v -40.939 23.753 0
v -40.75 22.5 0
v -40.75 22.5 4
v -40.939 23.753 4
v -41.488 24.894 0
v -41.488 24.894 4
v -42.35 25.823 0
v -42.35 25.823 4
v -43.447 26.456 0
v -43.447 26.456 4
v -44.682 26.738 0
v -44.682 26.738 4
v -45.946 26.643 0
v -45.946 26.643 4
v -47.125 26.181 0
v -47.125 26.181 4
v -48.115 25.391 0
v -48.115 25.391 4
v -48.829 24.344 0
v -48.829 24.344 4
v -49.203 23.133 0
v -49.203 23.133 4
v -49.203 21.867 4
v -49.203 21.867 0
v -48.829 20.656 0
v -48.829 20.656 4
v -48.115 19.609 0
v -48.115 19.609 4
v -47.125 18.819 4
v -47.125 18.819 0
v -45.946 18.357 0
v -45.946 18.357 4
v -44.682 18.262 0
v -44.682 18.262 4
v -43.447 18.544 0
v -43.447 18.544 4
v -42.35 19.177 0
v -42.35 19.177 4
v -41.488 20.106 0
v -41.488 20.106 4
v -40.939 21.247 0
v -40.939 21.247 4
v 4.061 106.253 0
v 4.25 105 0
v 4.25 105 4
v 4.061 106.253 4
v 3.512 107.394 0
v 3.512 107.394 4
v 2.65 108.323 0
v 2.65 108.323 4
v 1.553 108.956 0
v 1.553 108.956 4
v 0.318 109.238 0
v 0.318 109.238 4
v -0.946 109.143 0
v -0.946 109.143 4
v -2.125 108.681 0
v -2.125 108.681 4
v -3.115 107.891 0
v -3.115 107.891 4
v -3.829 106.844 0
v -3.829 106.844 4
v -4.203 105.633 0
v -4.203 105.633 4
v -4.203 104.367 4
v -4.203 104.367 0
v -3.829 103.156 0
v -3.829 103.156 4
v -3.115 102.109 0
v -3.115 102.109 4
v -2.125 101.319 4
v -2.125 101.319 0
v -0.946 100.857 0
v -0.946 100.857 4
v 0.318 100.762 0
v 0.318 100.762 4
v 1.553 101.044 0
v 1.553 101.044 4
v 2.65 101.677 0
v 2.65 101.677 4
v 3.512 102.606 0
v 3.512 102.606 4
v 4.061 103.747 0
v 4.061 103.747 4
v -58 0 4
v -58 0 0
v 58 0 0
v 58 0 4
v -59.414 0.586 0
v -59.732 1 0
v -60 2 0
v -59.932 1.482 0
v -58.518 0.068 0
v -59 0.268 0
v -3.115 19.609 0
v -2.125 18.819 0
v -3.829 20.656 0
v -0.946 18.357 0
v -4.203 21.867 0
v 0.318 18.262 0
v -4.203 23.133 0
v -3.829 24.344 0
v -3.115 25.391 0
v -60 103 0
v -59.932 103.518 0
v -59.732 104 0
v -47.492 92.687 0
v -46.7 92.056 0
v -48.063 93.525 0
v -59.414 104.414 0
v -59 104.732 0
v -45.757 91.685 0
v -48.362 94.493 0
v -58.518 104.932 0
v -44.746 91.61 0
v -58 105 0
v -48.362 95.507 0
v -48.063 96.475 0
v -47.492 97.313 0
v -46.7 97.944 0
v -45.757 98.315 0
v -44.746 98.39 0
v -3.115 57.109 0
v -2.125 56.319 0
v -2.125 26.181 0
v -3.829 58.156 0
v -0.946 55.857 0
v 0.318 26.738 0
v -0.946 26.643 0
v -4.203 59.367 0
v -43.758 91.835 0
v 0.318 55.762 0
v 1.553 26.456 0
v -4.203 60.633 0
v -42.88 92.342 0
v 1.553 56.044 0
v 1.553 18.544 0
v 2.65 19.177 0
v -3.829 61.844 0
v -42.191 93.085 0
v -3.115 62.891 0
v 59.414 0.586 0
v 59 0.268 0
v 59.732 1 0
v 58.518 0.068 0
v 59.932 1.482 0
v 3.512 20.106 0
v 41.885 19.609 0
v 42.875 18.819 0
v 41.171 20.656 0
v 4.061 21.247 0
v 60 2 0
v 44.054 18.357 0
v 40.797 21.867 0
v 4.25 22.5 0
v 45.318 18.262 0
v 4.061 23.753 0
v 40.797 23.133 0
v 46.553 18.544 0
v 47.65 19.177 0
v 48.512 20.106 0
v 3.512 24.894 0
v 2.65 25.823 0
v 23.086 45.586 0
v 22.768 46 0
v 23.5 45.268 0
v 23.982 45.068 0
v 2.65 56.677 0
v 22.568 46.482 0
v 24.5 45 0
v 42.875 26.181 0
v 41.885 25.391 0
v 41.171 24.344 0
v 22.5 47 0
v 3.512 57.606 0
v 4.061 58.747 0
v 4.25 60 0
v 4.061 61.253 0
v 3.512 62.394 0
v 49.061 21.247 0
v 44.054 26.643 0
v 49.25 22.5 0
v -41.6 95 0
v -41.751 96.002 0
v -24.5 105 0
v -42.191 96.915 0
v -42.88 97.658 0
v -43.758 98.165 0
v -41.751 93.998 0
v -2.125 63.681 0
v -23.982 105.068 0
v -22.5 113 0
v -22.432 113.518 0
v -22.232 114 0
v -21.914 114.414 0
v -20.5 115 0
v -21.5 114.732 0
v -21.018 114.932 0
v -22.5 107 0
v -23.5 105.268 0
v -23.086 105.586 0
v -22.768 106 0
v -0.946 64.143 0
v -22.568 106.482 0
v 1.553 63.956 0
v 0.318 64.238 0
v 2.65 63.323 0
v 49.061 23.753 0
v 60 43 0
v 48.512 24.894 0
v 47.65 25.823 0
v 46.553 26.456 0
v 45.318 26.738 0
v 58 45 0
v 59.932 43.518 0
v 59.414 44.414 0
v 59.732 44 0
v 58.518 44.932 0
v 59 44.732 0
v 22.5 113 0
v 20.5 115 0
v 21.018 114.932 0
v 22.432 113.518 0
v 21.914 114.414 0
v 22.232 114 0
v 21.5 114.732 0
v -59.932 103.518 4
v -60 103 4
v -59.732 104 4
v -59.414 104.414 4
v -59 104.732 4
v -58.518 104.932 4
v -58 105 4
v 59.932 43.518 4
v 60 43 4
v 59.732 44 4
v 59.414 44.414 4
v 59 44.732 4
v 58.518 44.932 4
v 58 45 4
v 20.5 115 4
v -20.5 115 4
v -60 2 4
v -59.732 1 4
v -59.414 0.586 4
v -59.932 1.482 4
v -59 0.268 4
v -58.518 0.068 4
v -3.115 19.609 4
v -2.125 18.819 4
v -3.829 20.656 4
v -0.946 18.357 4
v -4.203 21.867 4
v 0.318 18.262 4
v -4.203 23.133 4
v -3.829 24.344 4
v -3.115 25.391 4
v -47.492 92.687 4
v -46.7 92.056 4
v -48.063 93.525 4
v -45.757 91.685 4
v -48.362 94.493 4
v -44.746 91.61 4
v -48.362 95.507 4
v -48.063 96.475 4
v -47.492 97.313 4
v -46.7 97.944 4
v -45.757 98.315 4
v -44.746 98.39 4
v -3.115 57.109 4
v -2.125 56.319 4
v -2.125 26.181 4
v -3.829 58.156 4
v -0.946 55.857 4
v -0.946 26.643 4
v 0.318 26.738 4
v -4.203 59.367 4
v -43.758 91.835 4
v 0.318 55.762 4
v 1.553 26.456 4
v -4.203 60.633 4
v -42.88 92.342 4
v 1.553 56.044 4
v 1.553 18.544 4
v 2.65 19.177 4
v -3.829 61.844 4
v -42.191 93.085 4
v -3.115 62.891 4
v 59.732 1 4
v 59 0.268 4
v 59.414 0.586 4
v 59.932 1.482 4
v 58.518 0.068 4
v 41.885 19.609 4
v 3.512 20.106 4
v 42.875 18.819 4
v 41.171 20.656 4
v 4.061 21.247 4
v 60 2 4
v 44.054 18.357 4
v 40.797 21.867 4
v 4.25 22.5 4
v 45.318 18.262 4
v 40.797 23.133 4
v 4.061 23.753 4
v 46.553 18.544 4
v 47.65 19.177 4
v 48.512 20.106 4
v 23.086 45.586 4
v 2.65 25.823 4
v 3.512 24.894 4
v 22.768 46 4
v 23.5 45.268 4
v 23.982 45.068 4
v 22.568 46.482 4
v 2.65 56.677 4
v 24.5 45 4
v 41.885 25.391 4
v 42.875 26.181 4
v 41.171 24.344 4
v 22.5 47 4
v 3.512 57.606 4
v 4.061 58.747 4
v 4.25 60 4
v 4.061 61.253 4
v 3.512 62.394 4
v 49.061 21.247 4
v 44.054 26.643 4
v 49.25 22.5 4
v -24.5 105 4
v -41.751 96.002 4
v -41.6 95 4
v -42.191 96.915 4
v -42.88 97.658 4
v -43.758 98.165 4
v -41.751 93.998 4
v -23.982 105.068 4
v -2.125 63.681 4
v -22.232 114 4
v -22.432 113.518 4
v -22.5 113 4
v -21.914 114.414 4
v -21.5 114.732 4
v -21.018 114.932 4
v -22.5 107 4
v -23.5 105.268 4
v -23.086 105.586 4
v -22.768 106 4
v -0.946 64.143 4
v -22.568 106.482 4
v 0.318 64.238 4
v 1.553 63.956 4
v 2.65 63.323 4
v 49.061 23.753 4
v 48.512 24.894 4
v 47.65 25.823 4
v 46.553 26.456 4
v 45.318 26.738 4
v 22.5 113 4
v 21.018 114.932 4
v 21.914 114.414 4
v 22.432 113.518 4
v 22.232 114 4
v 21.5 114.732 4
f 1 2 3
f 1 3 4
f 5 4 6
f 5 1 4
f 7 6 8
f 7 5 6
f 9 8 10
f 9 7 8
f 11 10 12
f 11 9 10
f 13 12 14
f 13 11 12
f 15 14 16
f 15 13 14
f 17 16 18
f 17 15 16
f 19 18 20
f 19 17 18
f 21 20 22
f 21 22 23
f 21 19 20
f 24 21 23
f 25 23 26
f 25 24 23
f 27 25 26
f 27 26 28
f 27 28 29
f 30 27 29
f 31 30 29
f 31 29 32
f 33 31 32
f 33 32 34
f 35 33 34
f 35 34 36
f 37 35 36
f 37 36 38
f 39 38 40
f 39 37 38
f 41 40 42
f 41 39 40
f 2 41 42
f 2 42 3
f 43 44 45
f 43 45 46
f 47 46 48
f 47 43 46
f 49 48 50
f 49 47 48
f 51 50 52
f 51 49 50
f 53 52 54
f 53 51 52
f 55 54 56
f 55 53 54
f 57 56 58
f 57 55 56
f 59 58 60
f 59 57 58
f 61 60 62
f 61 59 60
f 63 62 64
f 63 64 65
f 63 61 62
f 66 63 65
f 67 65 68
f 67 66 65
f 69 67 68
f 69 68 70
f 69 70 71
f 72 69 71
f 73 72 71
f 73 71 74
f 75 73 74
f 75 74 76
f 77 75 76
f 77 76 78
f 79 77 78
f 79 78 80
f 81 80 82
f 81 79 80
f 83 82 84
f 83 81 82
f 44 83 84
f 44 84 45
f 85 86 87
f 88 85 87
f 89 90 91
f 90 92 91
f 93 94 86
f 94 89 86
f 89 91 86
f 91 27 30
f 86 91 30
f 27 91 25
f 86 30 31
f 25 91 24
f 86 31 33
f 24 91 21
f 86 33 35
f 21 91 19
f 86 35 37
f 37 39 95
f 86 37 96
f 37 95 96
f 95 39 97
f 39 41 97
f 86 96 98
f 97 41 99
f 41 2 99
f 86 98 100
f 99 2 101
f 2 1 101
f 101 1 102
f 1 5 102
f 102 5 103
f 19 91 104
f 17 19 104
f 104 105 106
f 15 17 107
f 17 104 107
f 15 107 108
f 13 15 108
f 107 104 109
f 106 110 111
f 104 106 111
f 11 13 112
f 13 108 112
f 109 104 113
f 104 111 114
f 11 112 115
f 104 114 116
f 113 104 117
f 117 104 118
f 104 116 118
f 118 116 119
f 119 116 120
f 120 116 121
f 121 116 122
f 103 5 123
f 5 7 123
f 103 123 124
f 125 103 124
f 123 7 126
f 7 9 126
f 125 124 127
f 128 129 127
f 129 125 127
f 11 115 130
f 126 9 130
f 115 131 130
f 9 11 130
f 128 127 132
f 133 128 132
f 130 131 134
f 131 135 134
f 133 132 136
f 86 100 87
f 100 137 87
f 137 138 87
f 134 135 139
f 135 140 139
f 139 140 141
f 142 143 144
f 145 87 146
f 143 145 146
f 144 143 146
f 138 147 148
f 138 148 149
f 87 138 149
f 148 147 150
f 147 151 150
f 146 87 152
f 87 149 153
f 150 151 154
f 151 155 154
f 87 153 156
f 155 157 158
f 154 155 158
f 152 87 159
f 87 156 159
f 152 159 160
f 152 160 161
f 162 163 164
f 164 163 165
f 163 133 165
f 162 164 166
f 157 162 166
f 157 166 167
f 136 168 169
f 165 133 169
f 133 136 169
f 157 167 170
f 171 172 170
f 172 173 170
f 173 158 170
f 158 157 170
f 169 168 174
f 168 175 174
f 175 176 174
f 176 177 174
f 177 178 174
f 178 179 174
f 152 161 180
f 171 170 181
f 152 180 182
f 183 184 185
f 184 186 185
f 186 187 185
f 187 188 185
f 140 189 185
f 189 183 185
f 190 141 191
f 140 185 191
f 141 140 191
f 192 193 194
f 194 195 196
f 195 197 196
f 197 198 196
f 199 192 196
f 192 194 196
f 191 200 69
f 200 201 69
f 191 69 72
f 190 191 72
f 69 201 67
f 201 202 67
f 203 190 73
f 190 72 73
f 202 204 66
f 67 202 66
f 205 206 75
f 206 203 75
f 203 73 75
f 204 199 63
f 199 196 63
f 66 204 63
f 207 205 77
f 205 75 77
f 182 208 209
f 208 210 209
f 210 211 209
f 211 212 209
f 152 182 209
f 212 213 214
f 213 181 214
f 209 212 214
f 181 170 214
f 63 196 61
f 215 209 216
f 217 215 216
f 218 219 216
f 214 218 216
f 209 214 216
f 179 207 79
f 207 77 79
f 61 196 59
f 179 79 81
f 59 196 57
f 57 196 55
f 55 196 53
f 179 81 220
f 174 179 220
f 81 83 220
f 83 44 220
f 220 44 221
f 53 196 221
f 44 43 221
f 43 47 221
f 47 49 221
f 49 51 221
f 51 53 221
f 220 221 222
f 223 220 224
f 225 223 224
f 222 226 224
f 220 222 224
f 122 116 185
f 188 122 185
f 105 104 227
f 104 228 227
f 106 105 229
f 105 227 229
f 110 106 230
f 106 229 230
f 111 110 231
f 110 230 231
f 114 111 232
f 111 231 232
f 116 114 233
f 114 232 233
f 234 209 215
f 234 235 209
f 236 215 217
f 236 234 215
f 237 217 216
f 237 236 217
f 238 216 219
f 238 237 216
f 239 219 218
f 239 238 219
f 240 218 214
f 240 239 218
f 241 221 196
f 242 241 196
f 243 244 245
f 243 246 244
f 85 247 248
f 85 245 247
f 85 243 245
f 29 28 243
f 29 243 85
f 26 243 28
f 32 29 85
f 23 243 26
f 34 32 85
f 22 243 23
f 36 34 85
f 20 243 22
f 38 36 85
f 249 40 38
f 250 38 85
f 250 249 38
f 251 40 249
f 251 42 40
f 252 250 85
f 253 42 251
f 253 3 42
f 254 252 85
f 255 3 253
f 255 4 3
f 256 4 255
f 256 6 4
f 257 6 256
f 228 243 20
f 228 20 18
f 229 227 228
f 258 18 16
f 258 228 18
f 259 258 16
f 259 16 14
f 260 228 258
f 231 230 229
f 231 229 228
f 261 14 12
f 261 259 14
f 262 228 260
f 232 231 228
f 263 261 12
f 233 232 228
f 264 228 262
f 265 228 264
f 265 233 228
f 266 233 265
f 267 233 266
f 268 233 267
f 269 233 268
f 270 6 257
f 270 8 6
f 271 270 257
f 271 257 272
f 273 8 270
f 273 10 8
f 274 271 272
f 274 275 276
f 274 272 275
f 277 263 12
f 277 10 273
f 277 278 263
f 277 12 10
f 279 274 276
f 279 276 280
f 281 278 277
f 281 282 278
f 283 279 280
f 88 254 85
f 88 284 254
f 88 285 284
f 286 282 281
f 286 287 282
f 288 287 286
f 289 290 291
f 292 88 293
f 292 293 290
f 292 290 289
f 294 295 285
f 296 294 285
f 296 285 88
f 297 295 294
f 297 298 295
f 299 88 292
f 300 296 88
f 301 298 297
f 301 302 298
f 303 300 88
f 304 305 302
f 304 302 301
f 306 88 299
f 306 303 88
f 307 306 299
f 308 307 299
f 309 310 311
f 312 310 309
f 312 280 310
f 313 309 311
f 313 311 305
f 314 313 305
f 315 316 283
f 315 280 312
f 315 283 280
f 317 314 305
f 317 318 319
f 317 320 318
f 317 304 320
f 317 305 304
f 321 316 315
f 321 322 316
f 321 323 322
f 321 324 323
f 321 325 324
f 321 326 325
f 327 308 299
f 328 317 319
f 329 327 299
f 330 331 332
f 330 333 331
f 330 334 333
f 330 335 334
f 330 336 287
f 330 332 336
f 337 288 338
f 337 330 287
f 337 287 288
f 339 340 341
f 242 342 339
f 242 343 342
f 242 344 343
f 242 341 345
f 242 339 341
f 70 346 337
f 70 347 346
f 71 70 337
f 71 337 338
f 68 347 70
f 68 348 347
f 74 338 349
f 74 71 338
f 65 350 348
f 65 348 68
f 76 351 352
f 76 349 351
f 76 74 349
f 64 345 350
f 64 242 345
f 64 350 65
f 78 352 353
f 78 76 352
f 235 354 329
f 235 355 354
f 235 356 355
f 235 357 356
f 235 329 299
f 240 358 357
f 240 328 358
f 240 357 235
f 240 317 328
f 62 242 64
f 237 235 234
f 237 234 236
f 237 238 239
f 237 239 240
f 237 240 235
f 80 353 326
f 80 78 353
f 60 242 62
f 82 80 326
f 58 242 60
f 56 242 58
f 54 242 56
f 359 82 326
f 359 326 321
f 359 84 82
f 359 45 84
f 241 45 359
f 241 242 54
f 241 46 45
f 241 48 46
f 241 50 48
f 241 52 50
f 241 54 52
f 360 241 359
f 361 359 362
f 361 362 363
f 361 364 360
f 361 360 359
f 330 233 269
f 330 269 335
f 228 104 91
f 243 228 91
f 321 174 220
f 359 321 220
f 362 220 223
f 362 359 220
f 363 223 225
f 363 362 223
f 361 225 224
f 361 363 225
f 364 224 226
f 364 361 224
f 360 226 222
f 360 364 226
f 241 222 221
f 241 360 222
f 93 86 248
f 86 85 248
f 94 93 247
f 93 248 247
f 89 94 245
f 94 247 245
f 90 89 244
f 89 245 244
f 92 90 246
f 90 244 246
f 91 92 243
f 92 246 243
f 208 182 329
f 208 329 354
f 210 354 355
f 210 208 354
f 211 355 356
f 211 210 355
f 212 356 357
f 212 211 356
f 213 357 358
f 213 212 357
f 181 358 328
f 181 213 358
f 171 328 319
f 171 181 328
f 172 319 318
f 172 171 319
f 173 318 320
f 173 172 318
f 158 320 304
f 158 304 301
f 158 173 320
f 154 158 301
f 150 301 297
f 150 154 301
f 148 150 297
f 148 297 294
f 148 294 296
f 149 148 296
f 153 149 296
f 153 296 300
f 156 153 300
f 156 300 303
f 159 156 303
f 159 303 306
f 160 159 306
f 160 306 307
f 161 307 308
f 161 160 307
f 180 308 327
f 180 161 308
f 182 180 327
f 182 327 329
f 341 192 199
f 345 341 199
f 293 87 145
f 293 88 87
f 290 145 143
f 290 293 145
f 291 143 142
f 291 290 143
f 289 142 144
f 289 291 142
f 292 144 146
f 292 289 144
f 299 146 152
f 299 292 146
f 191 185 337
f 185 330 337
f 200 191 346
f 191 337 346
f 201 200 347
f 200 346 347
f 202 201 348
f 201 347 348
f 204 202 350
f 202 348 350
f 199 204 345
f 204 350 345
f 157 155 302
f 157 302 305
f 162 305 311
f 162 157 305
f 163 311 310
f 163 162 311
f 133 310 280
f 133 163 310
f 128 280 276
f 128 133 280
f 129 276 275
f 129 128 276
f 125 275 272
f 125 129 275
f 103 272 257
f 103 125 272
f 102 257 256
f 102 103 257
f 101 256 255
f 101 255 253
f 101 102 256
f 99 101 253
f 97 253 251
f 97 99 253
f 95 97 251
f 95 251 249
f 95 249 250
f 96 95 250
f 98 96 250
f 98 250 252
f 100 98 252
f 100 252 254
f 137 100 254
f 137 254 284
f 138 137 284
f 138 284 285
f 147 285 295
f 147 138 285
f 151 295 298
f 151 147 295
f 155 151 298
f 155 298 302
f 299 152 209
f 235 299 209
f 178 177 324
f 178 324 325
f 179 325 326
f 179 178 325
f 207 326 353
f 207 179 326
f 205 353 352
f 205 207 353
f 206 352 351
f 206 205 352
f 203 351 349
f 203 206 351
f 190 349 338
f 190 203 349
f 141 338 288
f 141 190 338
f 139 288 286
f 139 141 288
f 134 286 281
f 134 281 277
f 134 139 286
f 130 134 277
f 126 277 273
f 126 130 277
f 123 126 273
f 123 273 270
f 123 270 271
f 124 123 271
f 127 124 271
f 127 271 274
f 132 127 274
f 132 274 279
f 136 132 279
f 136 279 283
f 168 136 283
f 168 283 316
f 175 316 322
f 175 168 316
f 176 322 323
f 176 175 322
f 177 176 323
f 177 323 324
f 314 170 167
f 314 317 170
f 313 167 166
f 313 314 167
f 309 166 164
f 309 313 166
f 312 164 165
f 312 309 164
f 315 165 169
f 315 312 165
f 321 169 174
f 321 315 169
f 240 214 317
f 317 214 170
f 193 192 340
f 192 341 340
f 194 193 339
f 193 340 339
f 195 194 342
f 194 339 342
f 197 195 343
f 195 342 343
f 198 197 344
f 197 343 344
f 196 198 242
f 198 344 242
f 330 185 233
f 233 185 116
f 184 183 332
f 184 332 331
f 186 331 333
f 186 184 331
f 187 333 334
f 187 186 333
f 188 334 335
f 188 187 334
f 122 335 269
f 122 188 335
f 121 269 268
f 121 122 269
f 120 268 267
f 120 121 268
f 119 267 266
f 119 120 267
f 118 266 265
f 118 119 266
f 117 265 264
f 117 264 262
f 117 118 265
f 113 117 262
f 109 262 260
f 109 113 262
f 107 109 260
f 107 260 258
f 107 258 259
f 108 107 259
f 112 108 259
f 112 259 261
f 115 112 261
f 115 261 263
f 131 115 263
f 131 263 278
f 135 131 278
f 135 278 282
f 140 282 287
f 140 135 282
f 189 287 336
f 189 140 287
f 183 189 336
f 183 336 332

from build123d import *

# Parameters (mm, degrees)
SKETCH1_R           = 4.25
SKETCH1_R_2         = 3.4
BOSS_EXTRUDE1_DEPTH = 4
FILLET1_R           = 2


with BuildPart() as part:
    # Sketch1 → Boss-Extrude1 (new body)
    with BuildSketch(Plane.XY):
        Polygon((-60, 0), (60, 0), (60, 45), (22.5, 45), (22.5, 115), (-22.5, 115), (-22.5, 105), (-60, 105), (-60, 45), align=None)
        with Locations((0, 22.5)):
            Circle(SKETCH1_R, mode=Mode.SUBTRACT)
        with Locations((-45, 22.5)):
            Circle(SKETCH1_R, mode=Mode.SUBTRACT)
        with Locations((45, 22.5)):
            Circle(SKETCH1_R, mode=Mode.SUBTRACT)
        with Locations((0, 105)):
            Circle(SKETCH1_R, mode=Mode.SUBTRACT)
        with Locations((0, 60)):
            Circle(SKETCH1_R, mode=Mode.SUBTRACT)
        with Locations((-45, 95)):
            Circle(SKETCH1_R_2, mode=Mode.SUBTRACT)
    extrude(amount=BOSS_EXTRUDE1_DEPTH)

    # Fillet1
    fillet1_edges = [part.edges().sort_by_distance(p)[0] for p in [
        (-60, 105, 2),
        (-22.5, 105, 2),
        (-22.5, 115, 2),
        (22.5, 115, 2),
        (22.5, 45, 2),
        (60, 45, 2),
        (60, 0, 2),
        (-60, 0, 2),
    ]]
    fillet(fillet1_edges, radius=FILLET1_R)


solid = part.part
